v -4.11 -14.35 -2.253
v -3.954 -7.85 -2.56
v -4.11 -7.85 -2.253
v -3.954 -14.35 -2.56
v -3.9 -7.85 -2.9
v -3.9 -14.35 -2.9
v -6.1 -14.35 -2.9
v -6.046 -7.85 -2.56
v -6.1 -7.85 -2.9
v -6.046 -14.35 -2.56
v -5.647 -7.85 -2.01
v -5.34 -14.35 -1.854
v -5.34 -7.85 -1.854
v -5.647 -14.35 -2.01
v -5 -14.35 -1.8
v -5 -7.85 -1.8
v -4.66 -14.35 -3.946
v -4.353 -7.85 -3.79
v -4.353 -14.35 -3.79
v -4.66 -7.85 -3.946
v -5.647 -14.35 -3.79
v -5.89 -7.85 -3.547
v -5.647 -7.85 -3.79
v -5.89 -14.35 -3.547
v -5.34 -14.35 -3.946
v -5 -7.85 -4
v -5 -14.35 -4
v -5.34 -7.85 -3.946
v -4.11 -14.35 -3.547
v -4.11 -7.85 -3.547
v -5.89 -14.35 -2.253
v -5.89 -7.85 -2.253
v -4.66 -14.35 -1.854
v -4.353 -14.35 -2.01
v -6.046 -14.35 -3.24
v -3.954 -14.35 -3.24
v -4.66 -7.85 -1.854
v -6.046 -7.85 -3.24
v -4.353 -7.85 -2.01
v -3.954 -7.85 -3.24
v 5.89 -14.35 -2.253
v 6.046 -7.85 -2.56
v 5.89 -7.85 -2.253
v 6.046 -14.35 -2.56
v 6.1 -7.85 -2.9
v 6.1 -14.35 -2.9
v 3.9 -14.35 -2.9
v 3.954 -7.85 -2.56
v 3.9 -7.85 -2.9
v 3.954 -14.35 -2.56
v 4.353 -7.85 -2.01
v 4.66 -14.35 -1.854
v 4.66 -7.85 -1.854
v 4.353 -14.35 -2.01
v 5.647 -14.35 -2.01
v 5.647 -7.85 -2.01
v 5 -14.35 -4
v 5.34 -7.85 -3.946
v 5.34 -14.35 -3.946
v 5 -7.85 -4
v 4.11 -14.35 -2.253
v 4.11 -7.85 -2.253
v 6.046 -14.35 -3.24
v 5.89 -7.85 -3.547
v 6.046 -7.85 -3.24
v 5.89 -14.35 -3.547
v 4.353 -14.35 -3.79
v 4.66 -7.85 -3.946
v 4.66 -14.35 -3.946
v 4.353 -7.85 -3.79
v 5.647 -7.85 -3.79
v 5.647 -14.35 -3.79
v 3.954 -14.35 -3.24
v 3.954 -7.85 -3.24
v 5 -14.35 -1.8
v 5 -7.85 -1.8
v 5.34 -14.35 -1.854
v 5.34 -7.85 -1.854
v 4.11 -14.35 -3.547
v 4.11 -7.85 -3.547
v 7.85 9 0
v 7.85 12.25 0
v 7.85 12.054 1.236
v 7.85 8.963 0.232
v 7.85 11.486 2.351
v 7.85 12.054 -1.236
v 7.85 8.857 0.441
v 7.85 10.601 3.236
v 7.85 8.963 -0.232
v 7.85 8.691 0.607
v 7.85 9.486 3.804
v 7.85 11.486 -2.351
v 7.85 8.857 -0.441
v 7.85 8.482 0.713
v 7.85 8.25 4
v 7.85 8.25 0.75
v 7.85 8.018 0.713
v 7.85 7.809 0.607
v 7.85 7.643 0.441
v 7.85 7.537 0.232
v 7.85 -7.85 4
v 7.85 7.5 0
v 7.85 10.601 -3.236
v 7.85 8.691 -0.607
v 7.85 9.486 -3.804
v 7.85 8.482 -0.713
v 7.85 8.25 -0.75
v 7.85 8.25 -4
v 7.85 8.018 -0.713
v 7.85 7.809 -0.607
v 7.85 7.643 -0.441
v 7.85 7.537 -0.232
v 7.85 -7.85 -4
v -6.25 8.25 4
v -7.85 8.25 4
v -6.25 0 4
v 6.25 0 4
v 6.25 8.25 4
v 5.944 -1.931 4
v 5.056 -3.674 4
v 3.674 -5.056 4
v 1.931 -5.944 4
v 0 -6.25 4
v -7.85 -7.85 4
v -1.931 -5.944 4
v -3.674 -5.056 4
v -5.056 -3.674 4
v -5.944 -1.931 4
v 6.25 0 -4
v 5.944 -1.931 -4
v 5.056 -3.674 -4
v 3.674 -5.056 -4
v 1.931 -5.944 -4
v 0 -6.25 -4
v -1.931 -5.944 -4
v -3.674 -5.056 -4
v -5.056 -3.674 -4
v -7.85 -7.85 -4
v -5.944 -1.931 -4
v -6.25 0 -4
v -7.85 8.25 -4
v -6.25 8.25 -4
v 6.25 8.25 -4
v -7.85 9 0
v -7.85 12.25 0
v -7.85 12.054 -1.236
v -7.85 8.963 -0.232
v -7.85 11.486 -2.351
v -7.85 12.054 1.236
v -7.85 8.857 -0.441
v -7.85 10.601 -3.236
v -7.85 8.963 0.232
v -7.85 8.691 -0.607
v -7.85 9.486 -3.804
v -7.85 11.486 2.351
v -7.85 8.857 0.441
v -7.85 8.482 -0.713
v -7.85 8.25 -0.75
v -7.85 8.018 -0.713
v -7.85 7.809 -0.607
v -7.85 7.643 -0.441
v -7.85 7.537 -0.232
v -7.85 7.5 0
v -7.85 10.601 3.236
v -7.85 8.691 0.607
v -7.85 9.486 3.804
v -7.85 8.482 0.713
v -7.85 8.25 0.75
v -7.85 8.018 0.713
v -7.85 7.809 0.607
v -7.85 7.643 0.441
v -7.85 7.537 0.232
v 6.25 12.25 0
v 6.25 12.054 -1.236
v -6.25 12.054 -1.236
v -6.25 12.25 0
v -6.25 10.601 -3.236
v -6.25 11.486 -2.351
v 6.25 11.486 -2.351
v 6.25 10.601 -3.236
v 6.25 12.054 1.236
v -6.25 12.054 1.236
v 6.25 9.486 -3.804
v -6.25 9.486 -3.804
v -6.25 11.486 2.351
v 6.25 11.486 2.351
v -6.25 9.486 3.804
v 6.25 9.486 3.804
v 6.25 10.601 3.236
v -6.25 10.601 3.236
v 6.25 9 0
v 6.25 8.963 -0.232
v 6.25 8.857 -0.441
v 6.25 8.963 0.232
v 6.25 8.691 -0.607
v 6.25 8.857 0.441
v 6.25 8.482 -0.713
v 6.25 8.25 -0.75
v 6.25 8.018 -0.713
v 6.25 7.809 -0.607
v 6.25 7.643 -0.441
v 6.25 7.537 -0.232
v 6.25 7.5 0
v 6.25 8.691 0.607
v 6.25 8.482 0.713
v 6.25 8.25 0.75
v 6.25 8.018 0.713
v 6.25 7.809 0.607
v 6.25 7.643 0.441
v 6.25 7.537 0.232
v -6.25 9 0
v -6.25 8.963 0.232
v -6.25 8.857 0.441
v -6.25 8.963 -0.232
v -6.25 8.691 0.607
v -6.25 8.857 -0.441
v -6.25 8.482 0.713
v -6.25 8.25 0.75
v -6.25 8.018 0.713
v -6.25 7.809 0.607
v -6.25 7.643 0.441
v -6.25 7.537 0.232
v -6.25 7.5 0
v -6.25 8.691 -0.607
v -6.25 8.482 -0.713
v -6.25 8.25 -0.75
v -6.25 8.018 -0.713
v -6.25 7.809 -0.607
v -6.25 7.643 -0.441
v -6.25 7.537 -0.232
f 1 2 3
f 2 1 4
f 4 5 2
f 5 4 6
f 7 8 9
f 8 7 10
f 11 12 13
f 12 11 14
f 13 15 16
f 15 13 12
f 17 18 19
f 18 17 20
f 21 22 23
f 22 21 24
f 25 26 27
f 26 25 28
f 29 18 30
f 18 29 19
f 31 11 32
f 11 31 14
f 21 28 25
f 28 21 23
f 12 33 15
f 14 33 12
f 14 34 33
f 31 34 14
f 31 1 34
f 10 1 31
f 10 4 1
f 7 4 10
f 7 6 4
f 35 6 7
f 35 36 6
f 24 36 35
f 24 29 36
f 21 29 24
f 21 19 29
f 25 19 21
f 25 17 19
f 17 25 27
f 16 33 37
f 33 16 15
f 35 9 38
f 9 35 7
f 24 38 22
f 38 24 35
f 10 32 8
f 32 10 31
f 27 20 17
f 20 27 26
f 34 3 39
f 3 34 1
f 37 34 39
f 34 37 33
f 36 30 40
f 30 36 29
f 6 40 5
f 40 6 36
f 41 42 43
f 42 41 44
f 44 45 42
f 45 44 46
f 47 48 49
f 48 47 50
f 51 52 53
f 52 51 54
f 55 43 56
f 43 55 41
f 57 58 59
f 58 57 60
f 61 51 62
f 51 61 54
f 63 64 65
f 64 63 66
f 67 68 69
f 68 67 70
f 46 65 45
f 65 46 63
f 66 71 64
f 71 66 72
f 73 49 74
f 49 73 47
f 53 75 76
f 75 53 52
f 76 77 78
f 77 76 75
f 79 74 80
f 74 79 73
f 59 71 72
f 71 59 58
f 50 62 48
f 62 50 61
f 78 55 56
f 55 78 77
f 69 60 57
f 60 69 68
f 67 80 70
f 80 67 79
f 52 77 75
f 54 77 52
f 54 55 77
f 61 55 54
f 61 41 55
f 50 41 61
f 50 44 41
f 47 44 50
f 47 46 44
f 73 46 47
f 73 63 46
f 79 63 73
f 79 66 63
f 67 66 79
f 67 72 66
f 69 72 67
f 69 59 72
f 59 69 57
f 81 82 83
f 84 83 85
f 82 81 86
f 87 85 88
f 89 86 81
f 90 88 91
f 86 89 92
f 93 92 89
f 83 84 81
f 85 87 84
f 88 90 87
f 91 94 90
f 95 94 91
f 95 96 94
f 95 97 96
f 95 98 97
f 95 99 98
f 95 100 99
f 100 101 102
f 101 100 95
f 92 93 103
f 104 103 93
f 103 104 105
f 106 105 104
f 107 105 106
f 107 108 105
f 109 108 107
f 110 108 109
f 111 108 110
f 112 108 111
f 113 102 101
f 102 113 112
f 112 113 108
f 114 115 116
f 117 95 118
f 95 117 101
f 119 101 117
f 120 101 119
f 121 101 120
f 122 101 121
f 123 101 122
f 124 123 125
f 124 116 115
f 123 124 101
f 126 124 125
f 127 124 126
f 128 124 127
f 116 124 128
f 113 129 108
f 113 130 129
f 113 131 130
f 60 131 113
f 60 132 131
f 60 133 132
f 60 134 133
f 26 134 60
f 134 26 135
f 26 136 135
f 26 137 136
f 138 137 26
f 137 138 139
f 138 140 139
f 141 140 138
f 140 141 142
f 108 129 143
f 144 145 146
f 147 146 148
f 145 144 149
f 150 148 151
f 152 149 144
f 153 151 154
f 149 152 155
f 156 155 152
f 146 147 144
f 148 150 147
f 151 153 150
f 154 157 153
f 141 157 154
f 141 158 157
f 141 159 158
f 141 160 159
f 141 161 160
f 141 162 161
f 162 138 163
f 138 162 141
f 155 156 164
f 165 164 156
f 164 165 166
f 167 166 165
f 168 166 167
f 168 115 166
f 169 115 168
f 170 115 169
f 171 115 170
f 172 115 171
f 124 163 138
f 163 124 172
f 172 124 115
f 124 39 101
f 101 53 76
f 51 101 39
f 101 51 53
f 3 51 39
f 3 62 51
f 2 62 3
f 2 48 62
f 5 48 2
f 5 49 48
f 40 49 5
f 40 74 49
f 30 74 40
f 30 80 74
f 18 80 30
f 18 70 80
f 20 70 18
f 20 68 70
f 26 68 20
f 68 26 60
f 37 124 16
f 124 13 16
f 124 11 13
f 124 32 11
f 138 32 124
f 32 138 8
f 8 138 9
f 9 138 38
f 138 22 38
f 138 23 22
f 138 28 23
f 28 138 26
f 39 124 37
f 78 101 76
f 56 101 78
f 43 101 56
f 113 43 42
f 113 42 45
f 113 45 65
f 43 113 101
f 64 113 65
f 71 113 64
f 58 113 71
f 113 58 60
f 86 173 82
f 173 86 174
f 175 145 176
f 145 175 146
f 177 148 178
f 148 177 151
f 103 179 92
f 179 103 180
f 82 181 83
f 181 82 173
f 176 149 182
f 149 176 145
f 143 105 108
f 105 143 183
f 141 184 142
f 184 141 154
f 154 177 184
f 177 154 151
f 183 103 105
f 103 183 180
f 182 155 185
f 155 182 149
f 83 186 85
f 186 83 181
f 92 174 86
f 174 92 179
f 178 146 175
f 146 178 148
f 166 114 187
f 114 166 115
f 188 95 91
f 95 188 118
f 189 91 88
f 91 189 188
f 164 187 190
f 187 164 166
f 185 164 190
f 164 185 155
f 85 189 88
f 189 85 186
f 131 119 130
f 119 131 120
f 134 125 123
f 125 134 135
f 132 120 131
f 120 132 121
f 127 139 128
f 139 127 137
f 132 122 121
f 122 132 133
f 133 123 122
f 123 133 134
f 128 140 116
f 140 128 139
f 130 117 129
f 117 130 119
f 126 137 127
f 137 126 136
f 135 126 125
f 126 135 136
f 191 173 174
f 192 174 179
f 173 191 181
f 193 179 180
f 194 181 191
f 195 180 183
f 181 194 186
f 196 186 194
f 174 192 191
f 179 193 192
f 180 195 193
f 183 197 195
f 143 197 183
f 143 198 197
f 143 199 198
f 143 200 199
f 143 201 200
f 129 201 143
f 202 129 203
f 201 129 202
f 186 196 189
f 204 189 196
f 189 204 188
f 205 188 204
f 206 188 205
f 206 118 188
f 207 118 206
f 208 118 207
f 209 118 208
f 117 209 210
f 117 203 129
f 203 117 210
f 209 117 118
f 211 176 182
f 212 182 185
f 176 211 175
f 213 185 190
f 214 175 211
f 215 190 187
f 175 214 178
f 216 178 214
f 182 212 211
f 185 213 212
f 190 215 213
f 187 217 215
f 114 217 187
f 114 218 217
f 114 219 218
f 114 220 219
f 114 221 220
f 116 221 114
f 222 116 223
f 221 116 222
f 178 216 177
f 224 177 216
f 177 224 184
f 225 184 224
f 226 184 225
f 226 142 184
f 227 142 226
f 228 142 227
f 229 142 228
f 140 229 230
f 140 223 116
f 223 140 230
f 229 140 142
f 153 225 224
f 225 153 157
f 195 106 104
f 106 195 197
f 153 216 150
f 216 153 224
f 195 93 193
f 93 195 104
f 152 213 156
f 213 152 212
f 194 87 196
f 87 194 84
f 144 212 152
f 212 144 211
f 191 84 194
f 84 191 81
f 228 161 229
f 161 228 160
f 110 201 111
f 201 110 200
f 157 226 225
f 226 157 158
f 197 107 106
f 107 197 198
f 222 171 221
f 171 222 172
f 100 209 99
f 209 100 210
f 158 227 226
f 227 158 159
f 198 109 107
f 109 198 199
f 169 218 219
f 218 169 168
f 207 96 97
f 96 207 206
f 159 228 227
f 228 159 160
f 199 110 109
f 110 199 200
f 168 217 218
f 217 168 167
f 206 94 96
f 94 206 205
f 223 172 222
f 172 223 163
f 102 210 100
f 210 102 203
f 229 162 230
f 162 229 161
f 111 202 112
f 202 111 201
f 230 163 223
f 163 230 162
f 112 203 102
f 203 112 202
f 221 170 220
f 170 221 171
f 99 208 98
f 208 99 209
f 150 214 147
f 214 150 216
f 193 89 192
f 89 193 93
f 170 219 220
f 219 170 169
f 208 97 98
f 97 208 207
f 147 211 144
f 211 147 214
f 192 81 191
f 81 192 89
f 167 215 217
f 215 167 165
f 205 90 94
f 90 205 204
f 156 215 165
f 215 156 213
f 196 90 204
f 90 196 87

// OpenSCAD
rpm_switch = false;

// rail saddle
D = 12.5; // with minimal margin
H = rpm_switch ? 11 : 8;
E = rpm_switch ? 4.2: 1.6;  // top edge
e = 1.6;  // side edge

// screw
m = 3;
g = 0.5;  // gap with rail
z = 0.5;

// switch pivots
a = 10;   // distance
d = 2.2;  // diameter
h = 6.5;  // height

// RPM switch dupont connector
c1 = 2.6;
c3 = 3 * c1 + 1; 

if (rpm_switch)
{
    E = 2*e + c;
}

if (false)
{
    union() {
        // rail
        color("red")
        cylinder(r=D/2, h=2*H, center=true, $fn=20);

        // screw
        color("green")
        translate([ 0, D/2+g+m/2, 0 ])
        rotate([ 0, 90, 0 ])
        cylinder(r=m/2, h=3*D, center=true, $fn=20);
    }

    if (rpm_switch)
    {
        translate([ 0, -c1/2-D/2-g, 0 ])
        cube([ 3*D, c1, c3 ], center=true);
    }
}


#difference() 
{
union() {
    // saddle bloc
    
    translate([ -D/2-e, -E-D/2, -H/2 ])
    cube( [ D+2*e, E+D+g+m/2, H ]);

    // saddle bloc around screw
    
    translate([ 0, D/2+g+m/2, 0 ])
    rotate([ 0, 90, 0 ])
    cylinder(r=H/2, h=D+2*e, center=true, $fn=20);


    // switch pivots

    if (!rpm_switch)
    {
        translate([ -a/2, 0, d/2-H/2 ])
        rotate([ 90, 0, 0 ])
        cylinder(r=d/2, h=D/2+E+h, $fn=20);

        translate([ a/2, 0, d/2-H/2 ])
        rotate([ 90, 0, 0 ])
        cylinder(r=d/2, h=D/2+E+h, $fn=20);
    }
    
}
union() {
    
    // rail
    cylinder(r=D/2, h=2*H, center=true, $fn=20);

    // rail passage
    translate([ 0, D, 0 ])
    cube( [ D, 2*D, 2*H ], center=true);

    // screw with half a diameter space with rail
    translate([ 0, D/2+g+m/2, 0 ])
    rotate([ 0, 90, 0 ])
    cylinder(r=z*m/2, h=3*D, center=true, $fn=20);

    // RPM switch dupont connector
    if (rpm_switch)
    {
        translate([ 0, -c1/2-D/2-g, 0 ])
        cube([ 3*D, c1, c3 ], center=true);
    }
}
}
